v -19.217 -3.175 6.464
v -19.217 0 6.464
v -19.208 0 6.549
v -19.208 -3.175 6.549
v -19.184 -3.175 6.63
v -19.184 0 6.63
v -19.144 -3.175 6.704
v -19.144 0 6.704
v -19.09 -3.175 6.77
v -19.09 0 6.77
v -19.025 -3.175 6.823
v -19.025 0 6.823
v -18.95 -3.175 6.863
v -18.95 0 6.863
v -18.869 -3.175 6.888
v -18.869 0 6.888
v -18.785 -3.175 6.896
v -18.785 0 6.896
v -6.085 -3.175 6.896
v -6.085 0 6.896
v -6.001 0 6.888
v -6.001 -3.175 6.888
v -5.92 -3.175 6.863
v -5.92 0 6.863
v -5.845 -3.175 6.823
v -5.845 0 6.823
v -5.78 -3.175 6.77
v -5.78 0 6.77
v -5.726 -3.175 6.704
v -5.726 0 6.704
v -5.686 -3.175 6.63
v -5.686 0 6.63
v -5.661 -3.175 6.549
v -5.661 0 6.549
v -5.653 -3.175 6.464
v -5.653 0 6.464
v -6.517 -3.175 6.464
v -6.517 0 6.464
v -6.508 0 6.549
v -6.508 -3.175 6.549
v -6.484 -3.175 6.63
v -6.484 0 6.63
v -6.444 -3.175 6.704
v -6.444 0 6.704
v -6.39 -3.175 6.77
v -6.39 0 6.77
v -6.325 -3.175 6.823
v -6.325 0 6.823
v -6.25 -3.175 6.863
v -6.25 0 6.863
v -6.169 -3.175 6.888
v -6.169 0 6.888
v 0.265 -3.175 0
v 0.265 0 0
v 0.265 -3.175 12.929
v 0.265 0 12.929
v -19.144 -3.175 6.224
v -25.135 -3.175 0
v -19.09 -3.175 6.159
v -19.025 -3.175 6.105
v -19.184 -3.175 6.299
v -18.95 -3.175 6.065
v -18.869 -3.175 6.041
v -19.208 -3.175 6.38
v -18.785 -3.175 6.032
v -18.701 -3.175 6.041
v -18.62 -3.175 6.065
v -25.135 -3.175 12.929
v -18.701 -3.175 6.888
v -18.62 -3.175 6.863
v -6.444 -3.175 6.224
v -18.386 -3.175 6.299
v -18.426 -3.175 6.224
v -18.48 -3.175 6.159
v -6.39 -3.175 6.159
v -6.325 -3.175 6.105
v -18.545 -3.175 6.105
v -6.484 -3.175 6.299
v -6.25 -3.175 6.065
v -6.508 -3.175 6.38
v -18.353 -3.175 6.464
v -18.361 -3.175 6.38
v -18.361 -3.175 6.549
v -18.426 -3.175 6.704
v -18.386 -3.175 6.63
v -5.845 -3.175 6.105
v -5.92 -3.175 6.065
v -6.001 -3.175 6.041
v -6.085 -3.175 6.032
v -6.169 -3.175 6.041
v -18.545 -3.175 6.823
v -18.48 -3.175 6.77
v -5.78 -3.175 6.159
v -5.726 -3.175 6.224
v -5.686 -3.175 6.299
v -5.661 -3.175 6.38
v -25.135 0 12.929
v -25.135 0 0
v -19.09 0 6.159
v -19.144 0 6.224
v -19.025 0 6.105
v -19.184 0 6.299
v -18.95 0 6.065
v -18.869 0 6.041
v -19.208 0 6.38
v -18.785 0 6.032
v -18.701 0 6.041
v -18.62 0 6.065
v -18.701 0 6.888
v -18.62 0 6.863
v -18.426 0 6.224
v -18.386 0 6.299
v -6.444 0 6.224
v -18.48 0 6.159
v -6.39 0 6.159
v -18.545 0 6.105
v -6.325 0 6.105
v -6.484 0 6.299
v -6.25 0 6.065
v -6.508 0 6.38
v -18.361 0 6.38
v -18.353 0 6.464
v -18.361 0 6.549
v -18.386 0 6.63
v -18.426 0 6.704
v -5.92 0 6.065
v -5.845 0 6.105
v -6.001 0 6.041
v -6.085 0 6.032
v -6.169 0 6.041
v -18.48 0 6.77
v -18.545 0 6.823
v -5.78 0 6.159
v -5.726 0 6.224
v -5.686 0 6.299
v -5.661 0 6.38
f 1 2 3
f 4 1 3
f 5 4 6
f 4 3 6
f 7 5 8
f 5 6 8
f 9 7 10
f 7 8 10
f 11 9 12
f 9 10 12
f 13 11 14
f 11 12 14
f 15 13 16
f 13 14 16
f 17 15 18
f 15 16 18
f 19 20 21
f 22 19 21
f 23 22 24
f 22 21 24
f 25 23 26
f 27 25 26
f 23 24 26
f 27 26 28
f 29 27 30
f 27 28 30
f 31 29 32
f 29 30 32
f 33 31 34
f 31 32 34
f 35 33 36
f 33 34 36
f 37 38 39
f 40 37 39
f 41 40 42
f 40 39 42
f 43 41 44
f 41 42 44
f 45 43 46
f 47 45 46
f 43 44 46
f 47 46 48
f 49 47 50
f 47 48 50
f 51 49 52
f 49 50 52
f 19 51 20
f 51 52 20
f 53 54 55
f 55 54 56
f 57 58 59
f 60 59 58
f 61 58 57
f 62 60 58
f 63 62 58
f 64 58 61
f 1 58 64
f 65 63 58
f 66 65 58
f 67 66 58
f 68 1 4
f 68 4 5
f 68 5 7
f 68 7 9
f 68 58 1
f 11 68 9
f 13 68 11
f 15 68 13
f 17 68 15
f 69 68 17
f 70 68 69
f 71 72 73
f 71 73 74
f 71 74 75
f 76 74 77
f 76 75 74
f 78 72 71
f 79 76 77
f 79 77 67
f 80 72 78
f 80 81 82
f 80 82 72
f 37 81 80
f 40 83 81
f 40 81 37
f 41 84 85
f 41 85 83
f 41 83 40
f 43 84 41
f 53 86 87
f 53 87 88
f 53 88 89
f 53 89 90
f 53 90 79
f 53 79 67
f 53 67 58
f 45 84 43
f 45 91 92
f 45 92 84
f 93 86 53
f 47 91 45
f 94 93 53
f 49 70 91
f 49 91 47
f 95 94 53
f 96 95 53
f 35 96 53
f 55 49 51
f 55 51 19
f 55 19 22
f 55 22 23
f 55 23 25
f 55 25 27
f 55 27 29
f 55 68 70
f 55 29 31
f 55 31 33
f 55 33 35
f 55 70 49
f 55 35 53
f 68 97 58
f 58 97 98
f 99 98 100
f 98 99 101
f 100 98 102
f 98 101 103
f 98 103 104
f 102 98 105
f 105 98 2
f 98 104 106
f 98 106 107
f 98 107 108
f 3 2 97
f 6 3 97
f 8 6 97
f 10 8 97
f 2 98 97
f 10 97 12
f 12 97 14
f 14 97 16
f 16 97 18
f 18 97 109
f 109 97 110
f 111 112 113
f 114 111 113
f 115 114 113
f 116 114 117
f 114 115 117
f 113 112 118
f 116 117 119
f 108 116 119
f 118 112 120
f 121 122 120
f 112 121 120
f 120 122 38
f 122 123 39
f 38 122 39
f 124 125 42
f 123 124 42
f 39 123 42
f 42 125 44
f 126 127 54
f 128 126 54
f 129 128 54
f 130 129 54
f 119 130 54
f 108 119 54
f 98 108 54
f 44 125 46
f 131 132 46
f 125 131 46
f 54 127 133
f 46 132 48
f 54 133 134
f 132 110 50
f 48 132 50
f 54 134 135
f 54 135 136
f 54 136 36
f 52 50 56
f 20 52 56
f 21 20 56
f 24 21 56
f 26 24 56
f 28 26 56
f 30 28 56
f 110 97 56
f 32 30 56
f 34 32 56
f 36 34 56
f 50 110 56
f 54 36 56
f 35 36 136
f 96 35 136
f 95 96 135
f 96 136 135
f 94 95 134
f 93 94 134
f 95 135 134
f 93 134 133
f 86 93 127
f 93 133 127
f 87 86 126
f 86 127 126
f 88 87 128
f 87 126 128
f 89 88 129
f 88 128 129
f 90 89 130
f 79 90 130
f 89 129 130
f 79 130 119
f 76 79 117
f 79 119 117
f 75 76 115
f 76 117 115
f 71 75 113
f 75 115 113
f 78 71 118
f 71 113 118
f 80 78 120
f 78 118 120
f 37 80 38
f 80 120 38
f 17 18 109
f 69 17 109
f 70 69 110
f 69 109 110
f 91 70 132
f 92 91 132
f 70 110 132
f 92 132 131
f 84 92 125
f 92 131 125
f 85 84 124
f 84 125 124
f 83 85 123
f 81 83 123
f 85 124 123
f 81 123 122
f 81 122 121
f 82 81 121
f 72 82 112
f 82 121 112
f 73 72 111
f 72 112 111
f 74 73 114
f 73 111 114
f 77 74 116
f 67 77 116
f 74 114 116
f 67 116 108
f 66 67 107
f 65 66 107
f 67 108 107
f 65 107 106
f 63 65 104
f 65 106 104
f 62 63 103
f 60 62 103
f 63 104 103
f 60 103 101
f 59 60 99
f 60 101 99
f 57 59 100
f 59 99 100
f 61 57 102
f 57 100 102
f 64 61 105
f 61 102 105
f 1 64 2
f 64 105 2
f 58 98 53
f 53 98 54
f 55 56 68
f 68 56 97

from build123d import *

# Parameters (mm, degrees)
F1_DEPTH = 3.175


with BuildPart() as f1:
    # F0 (on Front) → F1 (new body)
    with BuildSketch(Plane.XZ):
        with BuildLine():
            Line((-18.7849326355, 12.9286), (-25.1349326355, 12.9286))
            Line((-25.1349326355, 12.9286), (-25.1349326355, 6.4643))
            Line((-25.1349326355, 6.4643), (-19.2167326355, 6.4643))
            ThreePointArc((-19.2167326355, 6.4643), (-19.0902613436, 6.7696287081), (-18.7849326355, 6.8961))
            Line((-18.7849326355, 6.8961), (-18.7849326355, 12.9286))
        make_face()
        with BuildLine():
            Line((-12.4349326355, 12.9286), (-18.7849326355, 12.9286))
            Line((-18.7849326355, 12.9286), (-18.7849326355, 6.8961))
            ThreePointArc((-18.7849326355, 6.8961), (-18.4796039274, 6.7696287081), (-18.3531326355, 6.4643))
            Line((-18.3531326355, 6.4643), (-12.4349326355, 6.4643))
            Line((-12.4349326355, 6.4643), (-12.4349326355, 12.9286))
        make_face()
        with BuildLine():
            Line((-6.0849326355, 12.9286), (-12.4349326355, 12.9286))
            Line((-12.4349326355, 12.9286), (-12.4349326355, 6.4643))
            Line((-12.4349326355, 6.4643), (-6.5167326355, 6.4643))
            ThreePointArc((-6.5167326355, 6.4643), (-6.3902613436, 6.7696287081), (-6.0849326355, 6.8961))
            Line((-6.0849326355, 6.8961), (-6.0849326355, 12.9286))
        make_face()
        with BuildLine():
            Line((0.2650673645, 12.9286), (-6.0849326355, 12.9286))
            Line((-6.0849326355, 12.9286), (-6.0849326355, 6.8961))
            ThreePointArc((-6.0849326355, 6.8961), (-5.7796039274, 6.7696287081), (-5.6531326355, 6.4643))
            Line((-5.6531326355, 6.4643), (0.2650673645, 6.4643))
            Line((0.2650673645, 6.4643), (0.2650673645, 12.9286))
        make_face()
        with BuildLine():
            Line((-19.2167326355, 6.4643), (-25.1349326355, 6.4643))
            Line((-25.1349326355, 6.4643), (-25.1349326355, 0))
            Line((-25.1349326355, 0), (-12.4349326355, 0))
            Line((-12.4349326355, 0), (-12.4349326355, 6.4643))
            Line((-12.4349326355, 6.4643), (-18.3531326355, 6.4643))
            ThreePointArc((-18.3531326355, 6.4643), (-18.7849326355, 6.0325), (-19.2167326355, 6.4643))
        make_face()
        with BuildLine():
            Line((-6.5167326355, 6.4643), (-12.4349326355, 6.4643))
            Line((-12.4349326355, 6.4643), (-12.4349326355, 0))
            Line((-12.4349326355, 0), (0.2650673645, 0))
            Line((0.2650673645, 0), (0.2650673645, 6.4643))
            Line((0.2650673645, 6.4643), (-5.6531326355, 6.4643))
            ThreePointArc((-5.6531326355, 6.4643), (-6.0849326355, 6.0325), (-6.5167326355, 6.4643))
        make_face()
    extrude(amount=F1_DEPTH)


solid = f1.part
